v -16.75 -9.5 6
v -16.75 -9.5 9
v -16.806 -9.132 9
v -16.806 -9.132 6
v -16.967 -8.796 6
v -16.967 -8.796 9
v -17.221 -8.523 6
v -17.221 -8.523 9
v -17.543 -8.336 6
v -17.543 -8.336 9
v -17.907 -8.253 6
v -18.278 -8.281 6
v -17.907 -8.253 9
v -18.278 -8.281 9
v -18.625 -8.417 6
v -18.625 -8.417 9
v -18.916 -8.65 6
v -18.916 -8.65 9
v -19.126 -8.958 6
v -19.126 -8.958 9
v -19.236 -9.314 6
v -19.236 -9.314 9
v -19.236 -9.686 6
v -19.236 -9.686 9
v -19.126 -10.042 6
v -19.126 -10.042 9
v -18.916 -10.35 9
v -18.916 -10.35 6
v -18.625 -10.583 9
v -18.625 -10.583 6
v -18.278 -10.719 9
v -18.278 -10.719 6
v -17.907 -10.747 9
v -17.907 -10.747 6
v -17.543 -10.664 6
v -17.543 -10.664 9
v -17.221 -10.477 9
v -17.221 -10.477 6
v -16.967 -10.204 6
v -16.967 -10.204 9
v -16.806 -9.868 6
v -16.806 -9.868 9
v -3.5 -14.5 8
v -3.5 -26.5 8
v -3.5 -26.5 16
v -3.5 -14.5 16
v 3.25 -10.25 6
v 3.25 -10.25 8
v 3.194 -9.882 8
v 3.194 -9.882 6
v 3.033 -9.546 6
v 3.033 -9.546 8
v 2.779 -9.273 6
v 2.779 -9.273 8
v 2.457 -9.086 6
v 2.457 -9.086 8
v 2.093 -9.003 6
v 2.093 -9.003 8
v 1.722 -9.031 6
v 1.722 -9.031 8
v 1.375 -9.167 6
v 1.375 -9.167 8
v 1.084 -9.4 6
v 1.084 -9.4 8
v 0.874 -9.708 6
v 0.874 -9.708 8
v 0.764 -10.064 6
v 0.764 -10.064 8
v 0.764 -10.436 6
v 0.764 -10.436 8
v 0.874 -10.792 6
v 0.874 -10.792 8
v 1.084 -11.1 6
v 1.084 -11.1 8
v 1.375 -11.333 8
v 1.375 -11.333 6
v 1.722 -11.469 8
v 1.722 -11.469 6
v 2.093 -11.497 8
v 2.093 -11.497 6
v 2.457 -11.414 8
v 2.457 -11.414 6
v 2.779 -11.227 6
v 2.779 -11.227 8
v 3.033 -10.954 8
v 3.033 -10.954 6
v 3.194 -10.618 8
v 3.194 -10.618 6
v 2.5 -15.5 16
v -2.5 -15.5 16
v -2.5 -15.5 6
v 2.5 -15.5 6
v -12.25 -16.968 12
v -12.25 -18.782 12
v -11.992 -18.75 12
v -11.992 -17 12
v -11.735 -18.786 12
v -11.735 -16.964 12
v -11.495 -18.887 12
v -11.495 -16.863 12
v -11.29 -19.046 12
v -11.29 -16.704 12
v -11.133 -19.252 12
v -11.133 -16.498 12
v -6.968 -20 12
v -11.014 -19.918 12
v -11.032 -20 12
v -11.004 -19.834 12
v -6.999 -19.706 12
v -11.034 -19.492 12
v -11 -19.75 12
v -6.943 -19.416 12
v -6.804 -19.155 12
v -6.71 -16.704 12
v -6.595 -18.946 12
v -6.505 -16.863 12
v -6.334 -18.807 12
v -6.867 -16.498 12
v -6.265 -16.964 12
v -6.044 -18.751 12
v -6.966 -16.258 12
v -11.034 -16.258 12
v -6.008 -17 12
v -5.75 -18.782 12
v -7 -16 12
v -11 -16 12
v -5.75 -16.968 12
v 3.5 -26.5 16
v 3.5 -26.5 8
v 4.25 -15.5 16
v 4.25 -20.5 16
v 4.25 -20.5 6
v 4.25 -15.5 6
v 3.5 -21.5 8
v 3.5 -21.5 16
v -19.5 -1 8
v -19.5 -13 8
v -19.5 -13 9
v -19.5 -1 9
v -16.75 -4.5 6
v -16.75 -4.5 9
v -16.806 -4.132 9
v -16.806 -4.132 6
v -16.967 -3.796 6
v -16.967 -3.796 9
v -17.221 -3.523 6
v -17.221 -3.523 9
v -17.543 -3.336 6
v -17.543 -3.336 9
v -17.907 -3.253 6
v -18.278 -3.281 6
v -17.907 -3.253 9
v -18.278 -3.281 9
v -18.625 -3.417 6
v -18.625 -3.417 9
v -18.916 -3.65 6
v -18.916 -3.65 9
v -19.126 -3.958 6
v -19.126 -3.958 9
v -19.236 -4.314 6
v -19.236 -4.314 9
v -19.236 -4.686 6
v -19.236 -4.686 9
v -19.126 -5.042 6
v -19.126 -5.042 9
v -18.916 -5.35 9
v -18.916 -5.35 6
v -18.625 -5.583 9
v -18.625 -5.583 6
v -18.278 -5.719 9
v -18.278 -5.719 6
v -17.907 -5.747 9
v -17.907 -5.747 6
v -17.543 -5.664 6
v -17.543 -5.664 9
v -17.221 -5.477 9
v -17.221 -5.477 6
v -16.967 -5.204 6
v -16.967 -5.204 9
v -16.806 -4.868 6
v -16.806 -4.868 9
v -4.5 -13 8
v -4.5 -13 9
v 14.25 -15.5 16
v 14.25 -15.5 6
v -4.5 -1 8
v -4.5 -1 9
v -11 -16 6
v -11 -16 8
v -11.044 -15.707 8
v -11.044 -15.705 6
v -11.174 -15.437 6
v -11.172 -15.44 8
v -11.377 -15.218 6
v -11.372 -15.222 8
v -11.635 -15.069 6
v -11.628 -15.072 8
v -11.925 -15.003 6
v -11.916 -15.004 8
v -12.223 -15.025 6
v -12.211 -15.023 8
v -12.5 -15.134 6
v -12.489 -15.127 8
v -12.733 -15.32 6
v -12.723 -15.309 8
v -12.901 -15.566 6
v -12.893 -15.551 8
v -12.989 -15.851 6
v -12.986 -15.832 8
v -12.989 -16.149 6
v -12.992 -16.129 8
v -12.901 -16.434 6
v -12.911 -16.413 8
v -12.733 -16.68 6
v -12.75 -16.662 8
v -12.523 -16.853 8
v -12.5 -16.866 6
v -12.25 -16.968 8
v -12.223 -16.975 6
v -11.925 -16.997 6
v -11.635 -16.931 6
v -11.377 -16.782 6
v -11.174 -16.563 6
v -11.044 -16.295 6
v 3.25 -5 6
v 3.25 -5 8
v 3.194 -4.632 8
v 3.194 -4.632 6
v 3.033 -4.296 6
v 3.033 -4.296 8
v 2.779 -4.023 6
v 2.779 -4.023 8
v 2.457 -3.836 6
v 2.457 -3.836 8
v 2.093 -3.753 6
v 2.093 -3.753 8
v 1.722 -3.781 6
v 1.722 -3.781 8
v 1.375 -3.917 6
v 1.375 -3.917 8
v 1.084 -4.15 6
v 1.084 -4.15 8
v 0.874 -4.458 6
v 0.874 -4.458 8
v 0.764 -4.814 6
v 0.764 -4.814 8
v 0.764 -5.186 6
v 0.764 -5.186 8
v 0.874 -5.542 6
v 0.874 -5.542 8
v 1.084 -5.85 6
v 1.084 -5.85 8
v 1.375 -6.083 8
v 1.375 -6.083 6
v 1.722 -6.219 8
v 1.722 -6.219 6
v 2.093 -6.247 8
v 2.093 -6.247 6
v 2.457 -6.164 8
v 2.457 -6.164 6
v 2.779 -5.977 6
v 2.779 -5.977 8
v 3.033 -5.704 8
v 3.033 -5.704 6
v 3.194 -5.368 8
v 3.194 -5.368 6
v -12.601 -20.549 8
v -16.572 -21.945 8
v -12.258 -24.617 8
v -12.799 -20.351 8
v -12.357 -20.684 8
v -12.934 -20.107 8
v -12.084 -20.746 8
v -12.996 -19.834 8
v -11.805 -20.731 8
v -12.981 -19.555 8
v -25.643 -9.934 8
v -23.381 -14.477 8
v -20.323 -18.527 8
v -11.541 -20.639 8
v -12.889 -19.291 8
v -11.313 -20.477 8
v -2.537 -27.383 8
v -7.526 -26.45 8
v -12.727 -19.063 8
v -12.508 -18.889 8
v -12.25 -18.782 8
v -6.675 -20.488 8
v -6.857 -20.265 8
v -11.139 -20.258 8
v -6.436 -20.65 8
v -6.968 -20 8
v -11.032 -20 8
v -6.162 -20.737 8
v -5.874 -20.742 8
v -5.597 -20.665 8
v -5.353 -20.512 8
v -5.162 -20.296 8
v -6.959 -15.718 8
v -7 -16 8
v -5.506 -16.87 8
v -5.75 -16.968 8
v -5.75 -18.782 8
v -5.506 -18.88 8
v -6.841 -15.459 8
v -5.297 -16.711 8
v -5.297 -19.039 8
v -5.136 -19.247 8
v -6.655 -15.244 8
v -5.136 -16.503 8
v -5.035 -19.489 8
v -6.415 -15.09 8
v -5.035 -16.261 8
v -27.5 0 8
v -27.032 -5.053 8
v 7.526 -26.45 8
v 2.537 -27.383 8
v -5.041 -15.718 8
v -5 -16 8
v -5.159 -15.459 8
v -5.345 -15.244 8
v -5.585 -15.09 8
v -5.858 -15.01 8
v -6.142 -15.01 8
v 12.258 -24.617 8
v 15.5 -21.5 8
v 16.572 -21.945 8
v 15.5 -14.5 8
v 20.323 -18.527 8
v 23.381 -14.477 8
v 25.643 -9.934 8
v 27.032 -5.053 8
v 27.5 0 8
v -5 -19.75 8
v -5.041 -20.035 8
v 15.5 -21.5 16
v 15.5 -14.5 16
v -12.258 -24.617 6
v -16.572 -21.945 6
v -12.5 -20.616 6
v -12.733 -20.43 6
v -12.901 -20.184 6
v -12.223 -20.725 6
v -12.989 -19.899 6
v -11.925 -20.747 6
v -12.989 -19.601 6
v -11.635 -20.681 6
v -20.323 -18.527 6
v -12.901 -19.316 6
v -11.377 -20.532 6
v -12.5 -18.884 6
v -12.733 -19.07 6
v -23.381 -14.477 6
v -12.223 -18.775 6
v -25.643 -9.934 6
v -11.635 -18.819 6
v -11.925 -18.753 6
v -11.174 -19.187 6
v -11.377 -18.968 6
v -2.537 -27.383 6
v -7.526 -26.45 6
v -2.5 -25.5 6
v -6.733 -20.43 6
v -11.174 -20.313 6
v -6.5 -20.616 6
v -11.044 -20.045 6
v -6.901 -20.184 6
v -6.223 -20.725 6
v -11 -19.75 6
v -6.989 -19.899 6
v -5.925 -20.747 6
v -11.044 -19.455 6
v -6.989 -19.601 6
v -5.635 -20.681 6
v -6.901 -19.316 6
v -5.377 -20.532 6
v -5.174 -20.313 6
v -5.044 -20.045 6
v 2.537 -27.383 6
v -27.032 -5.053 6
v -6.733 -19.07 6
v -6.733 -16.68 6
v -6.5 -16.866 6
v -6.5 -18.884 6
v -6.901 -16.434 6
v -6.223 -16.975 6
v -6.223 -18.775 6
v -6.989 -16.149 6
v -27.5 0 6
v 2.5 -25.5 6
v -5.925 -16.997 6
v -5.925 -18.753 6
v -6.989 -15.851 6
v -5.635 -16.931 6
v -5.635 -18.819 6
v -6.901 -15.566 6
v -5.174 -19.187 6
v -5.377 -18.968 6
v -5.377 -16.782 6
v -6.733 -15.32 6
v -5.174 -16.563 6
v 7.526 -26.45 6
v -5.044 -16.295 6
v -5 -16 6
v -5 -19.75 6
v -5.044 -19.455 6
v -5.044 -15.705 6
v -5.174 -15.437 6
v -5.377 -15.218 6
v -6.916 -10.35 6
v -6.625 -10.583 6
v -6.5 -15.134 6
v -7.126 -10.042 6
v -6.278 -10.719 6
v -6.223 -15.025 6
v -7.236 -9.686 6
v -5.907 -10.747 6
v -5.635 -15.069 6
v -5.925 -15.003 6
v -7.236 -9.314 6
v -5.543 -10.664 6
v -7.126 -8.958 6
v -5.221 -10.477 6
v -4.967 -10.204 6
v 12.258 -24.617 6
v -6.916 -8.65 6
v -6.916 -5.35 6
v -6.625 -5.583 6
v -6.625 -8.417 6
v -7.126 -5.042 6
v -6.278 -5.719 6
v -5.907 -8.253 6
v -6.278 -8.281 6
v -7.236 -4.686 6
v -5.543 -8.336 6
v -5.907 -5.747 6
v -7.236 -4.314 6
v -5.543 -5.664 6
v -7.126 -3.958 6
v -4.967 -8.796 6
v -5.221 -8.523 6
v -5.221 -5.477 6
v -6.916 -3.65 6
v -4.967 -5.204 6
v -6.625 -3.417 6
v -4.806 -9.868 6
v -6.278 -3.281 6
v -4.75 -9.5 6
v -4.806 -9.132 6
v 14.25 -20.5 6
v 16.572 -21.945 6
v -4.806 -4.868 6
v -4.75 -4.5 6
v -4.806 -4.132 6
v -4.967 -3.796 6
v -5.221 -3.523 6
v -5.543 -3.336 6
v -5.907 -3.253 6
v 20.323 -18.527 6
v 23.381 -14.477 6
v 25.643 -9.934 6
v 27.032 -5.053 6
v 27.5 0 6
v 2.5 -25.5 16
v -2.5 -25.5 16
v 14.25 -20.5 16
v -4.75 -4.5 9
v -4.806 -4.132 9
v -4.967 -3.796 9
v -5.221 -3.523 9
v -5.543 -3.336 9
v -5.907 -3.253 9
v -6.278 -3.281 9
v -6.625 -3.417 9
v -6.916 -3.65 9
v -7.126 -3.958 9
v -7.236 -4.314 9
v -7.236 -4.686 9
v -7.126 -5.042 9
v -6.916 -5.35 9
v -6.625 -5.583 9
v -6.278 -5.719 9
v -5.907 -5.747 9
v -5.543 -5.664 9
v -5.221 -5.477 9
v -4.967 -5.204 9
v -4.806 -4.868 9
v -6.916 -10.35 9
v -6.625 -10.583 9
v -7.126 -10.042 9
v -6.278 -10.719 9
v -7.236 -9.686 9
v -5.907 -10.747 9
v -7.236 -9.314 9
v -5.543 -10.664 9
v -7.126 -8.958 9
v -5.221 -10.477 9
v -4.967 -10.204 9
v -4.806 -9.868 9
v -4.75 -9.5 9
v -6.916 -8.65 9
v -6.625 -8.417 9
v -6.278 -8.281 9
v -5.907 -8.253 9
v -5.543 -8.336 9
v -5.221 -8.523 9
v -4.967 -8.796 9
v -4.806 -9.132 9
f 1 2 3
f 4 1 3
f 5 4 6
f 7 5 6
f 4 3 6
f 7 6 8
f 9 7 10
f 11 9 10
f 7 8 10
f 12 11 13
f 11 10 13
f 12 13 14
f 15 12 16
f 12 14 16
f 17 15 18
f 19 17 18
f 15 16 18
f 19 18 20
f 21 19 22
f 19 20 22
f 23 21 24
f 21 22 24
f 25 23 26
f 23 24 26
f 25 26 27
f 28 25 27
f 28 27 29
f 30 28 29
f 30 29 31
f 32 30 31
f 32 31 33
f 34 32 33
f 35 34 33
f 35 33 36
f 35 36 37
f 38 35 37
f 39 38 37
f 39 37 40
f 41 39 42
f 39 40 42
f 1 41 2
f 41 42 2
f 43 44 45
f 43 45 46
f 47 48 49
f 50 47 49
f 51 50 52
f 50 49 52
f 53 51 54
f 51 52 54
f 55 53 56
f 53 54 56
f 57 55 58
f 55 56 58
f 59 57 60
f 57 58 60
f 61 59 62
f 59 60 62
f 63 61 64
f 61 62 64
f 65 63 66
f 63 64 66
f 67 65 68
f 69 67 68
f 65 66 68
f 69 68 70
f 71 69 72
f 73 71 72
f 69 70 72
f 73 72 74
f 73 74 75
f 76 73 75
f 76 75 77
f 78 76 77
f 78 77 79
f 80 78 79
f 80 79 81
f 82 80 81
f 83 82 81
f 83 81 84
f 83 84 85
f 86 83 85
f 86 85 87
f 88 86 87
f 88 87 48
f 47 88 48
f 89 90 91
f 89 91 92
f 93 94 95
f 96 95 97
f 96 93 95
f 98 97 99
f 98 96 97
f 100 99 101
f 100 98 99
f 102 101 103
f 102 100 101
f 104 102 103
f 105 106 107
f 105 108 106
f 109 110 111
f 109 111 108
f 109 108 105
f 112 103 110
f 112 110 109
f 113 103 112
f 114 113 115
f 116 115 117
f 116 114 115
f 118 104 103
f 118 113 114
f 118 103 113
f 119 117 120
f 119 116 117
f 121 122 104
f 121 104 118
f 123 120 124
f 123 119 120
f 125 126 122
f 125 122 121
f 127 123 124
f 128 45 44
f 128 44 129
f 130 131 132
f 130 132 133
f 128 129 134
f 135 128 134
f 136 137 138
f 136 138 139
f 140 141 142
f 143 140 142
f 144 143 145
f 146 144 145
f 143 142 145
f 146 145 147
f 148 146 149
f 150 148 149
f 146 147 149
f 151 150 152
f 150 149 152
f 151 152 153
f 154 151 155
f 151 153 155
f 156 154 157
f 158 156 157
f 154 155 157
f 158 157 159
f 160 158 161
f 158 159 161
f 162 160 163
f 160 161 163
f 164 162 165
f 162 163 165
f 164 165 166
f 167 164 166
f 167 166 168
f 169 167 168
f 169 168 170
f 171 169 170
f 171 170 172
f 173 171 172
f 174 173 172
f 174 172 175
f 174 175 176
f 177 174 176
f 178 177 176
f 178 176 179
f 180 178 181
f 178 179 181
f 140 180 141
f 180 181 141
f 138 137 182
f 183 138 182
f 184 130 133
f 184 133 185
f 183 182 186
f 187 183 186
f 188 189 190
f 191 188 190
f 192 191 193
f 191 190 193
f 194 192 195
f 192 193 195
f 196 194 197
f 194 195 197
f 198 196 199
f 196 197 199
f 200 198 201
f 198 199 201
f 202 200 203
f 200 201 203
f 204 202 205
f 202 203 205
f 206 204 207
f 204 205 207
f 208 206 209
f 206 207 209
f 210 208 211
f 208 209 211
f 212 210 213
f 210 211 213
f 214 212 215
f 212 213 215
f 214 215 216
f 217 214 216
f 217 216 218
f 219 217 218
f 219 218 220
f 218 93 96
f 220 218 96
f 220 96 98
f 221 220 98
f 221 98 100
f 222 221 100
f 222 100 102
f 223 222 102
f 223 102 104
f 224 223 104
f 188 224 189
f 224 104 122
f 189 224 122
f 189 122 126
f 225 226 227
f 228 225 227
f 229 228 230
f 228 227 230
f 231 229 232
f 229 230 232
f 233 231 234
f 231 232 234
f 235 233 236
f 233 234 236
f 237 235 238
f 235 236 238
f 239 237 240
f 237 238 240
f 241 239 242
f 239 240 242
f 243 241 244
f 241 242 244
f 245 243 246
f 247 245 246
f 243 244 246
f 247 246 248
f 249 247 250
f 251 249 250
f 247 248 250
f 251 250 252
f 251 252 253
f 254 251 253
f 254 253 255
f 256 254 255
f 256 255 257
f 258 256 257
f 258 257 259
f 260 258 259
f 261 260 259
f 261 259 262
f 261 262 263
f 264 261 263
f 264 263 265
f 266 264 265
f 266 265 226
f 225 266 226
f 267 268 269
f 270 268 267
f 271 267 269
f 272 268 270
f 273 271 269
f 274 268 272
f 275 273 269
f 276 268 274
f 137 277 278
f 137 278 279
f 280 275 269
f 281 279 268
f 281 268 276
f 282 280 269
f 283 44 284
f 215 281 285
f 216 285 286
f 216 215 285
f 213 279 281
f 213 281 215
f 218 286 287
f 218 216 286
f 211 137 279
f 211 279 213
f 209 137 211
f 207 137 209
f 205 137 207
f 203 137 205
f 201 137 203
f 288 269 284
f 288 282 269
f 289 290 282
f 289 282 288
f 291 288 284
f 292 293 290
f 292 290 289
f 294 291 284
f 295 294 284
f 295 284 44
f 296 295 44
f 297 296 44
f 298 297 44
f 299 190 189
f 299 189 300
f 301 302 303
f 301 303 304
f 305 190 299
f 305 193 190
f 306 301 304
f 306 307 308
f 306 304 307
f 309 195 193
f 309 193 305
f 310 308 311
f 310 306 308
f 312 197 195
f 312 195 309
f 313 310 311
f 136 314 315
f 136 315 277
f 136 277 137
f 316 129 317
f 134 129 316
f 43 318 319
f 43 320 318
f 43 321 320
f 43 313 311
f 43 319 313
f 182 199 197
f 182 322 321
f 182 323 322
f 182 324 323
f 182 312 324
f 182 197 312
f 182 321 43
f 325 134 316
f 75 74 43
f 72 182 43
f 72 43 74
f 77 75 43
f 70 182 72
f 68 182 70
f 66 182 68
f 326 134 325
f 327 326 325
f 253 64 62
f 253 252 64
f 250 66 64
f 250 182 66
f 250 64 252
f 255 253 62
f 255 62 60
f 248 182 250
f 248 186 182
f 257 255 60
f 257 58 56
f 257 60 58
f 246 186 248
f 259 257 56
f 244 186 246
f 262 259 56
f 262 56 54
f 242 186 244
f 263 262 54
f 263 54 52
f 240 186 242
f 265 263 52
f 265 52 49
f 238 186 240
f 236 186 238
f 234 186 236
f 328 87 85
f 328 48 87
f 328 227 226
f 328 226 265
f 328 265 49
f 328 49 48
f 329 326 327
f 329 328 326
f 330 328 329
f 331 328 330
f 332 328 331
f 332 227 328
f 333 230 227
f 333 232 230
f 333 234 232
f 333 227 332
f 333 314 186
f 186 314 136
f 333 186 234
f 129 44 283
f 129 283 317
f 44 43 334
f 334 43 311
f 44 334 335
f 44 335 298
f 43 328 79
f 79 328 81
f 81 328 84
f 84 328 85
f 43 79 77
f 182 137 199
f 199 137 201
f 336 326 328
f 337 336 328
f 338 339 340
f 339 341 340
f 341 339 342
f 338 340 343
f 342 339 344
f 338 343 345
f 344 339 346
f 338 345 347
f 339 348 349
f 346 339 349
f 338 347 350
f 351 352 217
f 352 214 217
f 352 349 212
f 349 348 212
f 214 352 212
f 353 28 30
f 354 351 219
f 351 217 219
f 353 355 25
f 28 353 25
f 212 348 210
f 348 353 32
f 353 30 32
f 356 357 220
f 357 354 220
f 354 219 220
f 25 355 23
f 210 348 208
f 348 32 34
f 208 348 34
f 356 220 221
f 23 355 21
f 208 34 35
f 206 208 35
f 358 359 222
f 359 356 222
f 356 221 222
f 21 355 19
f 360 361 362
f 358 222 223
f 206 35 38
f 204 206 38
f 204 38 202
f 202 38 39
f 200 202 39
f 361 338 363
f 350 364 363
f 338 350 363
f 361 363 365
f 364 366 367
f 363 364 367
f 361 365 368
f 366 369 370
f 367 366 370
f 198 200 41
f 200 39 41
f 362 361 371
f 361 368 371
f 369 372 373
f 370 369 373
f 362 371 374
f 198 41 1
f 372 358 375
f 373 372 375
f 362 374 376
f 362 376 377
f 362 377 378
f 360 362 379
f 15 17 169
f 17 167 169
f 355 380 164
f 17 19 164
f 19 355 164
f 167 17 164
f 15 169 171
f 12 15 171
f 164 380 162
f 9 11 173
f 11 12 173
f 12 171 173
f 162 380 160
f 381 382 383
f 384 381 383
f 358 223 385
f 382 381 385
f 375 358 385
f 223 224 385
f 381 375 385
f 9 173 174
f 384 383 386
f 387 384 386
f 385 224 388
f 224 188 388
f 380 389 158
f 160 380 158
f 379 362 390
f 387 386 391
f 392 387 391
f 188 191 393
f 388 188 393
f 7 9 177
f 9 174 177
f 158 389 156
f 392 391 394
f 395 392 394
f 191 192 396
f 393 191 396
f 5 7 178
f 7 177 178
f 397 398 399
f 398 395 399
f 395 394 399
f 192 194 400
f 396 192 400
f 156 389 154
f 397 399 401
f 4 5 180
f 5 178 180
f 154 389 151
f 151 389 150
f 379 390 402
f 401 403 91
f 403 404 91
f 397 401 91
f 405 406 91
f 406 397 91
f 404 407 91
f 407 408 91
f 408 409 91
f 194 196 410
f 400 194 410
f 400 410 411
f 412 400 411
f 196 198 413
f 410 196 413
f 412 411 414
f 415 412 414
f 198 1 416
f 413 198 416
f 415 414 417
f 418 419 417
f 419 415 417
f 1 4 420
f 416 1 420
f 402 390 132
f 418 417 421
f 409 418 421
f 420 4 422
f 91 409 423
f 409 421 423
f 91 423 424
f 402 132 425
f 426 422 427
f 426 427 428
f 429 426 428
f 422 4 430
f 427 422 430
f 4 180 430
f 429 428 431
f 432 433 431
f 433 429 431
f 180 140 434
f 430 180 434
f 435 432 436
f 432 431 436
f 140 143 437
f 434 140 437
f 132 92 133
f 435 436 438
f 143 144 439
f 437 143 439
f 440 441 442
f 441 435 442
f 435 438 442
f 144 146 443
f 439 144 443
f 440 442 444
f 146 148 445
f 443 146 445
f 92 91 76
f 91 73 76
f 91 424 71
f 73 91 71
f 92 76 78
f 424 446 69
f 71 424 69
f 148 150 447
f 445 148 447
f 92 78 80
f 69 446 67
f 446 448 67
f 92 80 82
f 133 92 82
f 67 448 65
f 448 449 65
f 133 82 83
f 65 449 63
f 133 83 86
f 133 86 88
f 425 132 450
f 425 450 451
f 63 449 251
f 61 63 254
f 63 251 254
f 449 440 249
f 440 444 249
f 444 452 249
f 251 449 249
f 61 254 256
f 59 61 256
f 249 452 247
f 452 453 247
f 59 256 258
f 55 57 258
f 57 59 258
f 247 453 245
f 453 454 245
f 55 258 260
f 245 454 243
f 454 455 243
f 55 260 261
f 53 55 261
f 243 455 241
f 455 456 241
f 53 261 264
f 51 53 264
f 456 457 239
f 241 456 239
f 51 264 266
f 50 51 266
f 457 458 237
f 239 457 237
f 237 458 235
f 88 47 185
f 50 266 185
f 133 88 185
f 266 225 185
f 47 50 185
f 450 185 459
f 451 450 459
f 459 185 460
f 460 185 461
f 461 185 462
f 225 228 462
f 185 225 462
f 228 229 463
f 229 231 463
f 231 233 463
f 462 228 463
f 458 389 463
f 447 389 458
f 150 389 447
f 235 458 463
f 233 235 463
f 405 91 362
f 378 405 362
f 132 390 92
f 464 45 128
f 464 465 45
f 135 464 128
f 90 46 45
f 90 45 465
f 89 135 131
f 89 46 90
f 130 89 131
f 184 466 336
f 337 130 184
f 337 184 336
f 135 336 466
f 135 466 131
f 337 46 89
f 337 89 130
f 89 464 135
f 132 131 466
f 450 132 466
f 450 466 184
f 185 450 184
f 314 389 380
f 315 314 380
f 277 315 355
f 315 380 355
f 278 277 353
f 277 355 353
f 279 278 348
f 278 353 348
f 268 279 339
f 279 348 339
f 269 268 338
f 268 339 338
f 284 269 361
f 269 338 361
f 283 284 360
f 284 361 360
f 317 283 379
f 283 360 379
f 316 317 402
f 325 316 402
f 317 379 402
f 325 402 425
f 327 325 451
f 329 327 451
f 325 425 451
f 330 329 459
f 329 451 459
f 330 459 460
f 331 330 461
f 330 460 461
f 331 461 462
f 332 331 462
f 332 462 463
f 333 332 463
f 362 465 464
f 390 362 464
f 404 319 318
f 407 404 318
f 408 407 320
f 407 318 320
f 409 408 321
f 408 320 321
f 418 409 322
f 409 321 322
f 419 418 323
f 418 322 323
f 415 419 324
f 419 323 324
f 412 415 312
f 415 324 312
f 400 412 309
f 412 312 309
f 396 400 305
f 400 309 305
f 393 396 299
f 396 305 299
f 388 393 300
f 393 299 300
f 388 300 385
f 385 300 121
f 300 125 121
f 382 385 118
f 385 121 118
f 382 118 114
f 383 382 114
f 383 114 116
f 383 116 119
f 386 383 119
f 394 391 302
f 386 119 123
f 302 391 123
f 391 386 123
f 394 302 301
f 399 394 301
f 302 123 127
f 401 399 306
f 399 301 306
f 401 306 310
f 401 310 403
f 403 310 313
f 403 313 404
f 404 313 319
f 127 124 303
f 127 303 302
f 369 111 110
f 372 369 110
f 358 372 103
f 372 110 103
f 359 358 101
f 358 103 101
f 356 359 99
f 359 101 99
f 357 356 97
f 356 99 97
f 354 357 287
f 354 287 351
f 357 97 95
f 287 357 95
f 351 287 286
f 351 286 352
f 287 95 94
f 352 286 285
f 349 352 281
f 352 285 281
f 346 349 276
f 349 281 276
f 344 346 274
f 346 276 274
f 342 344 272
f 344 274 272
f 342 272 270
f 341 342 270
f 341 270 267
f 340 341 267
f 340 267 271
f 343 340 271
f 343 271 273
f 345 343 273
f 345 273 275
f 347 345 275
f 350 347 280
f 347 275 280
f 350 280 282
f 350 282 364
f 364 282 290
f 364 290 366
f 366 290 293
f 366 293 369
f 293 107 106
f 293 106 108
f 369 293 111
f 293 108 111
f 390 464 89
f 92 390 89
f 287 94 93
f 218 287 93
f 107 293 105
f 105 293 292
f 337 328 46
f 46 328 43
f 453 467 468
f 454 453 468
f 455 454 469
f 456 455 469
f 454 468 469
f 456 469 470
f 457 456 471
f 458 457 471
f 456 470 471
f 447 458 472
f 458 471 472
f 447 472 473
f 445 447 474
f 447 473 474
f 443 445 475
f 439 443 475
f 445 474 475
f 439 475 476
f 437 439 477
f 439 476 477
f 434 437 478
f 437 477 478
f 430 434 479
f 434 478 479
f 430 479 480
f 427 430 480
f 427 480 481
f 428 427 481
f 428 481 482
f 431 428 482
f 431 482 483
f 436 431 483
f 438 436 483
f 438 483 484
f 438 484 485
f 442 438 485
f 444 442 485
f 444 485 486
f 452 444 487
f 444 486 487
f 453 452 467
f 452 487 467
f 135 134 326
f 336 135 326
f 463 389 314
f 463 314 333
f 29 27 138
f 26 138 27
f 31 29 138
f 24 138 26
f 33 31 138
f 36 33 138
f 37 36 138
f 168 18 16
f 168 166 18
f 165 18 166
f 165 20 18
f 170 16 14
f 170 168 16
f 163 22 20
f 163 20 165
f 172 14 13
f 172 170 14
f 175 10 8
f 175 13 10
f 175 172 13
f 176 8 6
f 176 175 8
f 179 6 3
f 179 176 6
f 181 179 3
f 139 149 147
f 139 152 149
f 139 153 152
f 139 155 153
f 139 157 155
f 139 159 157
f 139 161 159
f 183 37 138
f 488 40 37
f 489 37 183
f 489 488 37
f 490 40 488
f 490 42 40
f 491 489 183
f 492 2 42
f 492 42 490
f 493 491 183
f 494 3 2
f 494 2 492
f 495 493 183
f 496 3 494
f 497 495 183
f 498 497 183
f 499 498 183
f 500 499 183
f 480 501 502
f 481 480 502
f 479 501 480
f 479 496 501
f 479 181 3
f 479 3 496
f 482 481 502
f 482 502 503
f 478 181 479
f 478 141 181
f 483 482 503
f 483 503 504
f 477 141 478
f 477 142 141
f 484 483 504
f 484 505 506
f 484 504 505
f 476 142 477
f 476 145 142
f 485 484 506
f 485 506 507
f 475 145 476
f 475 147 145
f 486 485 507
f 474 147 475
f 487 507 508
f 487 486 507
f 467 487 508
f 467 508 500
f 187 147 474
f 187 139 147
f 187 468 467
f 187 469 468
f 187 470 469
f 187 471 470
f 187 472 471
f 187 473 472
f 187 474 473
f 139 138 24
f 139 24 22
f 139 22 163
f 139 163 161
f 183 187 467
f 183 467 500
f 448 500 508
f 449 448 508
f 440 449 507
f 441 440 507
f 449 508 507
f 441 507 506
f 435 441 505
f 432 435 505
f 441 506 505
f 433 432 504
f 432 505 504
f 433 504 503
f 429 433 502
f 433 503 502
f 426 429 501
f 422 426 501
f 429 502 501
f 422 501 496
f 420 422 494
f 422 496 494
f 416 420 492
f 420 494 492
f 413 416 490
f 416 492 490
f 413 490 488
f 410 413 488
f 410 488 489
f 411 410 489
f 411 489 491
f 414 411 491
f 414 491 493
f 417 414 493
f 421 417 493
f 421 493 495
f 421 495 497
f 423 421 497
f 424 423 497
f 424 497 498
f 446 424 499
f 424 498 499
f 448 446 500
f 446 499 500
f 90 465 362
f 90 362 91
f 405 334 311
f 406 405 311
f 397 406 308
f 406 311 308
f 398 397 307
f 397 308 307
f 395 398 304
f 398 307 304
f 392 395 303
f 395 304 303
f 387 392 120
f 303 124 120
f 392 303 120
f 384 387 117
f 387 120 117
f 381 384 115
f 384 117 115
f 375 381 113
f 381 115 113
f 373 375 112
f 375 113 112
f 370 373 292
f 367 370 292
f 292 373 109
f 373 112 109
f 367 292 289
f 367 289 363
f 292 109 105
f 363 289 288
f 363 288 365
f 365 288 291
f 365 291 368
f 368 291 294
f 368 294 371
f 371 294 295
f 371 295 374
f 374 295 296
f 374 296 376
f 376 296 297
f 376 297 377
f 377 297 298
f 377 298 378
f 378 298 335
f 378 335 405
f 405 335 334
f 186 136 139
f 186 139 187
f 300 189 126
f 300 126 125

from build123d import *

# Parameters (mm, degrees)
SKETCH009_W      = 5
SKETCH009_H      = 10
SKETCH009_W_2    = 10
SKETCH009_H_2    = 5
EXTRUDE008_DEPTH = 10
SKETCH008_R      = 1
EXTRUDE007_DEPTH = 6
SKETCH007_R      = 1.25
EXTRUDE006_DEPTH = 3
SKETCH004_R      = 1.25
EXTRUDE005_DEPTH = 3
SKETCH005_W      = 6.5
SKETCH005_H      = 4
EXTRUDE004_DEPTH = 4
SKETCH006_W      = 12
SKETCH006_H      = 7
SKETCH006_W_2    = 7
SKETCH006_H_2    = 12
EXTRUDE003_DEPTH = 8
SKETCH003_W      = 15
SKETCH003_H      = 12
EXTRUDE002_DEPTH = 1
EXTRUDE001_DEPTH = 6
EXTRUDE_DEPTH    = 8


with BuildPart() as usb_cuts:
    # Sketch009 → Extrude008 (new body)
    with BuildSketch(Plane.XY.offset(16)):
        with Locations((0, -20.5)):
            Rectangle(SKETCH009_W, SKETCH009_H)
        with Locations((9.25, -18)):
            Rectangle(SKETCH009_W_2, SKETCH009_H_2)
    extrude(amount=-EXTRUDE008_DEPTH)


with BuildPart() as reset_leads:
    # Sketch008 → Extrude007 (new body)
    with BuildSketch(Plane.XY.offset(12)):
        with Locations((-12, -16)):
            Circle(SKETCH008_R)
        with Locations((-6, -19.75)):
            Circle(SKETCH008_R)
        with Locations((-6, -16)):
            Circle(SKETCH008_R)
        with Locations((-12, -19.75)):
            Circle(SKETCH008_R)
    extrude(amount=-EXTRUDE007_DEPTH)


with BuildPart() as momentary_leads:
    # Sketch007 → Extrude006 (new body)
    with BuildSketch(Plane.XY.offset(9)):
        with Locations((-18, -9.5)):
            Circle(SKETCH007_R)
        with Locations((-18, -4.5)):
            Circle(SKETCH007_R)
        with Locations((-6, -9.5)):
            Circle(SKETCH007_R)
        with Locations((-6, -4.5)):
            Circle(SKETCH007_R)
    extrude(amount=-EXTRUDE006_DEPTH)


with BuildPart() as powerbuttonleads:
    # Sketch004 → Extrude005 (new body)
    with BuildSketch(Plane.XY.offset(8)):
        with Locations((2, -10.25)):
            Circle(SKETCH004_R)
        with Locations((2, -5)):
            Circle(SKETCH004_R)
    extrude(amount=-EXTRUDE005_DEPTH)


with BuildPart() as resetbutton001:
    # Sketch005 → Extrude004 (new body)
    with BuildSketch(Plane.XY.offset(8)):
        with Locations((-9, -18)):
            Rectangle(SKETCH005_W, SKETCH005_H)
    extrude(amount=EXTRUDE004_DEPTH)


with BuildPart() as usb_ports001:
    # Sketch006 → Extrude003 (new body)
    with BuildSketch(Plane.XY.offset(8)):
        with Locations((9.5, -18)):
            Rectangle(SKETCH006_W, SKETCH006_H)
        with Locations((0, -20.5)):
            Rectangle(SKETCH006_W_2, SKETCH006_H_2)
    extrude(amount=EXTRUDE003_DEPTH)


with BuildPart() as momentary_button:
    # Sketch003 → Extrude002 (new body)
    with BuildSketch(Plane.XY.offset(8)):
        with Locations((-12, -7)):
            Rectangle(SKETCH003_W, SKETCH003_H)
    extrude(amount=EXTRUDE002_DEPTH)


with BuildPart() as body_cut:
    # Sketch002 → Extrude001 (new body)
    with BuildSketch(Plane.XY):
        with BuildLine():
            ThreePointArc((-27.5, 0), (0, -27.5), (27.5, 0))
            Line((-27.5, 0), (27.5, 0))
        make_face()
    extrude(amount=EXTRUDE001_DEPTH)


with BuildPart() as cut004:
    # Sketch001 → Extrude (new body)
    with BuildSketch(Plane.XY):
        with BuildLine():
            ThreePointArc((-27.5, 0), (0, -27.5), (27.5, 0))
            Line((-27.5, 0), (27.5, 0))
        make_face()
    extrude(amount=EXTRUDE_DEPTH)

    # Cut: cut Body Cut
    add(body_cut.part, mode=Mode.SUBTRACT)

    # Fusion: union Momentary Button
    add(momentary_button.part)

    # Fusion001: union USB Ports001
    add(usb_ports001.part)

    # Fusion002: union ResetButton001
    add(resetbutton001.part)

    # Cut001: cut PowerButtonLeads
    add(powerbuttonleads.part, mode=Mode.SUBTRACT)

    # Cut002: cut momentary Leads
    add(momentary_leads.part, mode=Mode.SUBTRACT)

    # Cut003: cut Reset Leads
    add(reset_leads.part, mode=Mode.SUBTRACT)

    # Cut004: cut USB Cuts
    add(usb_cuts.part, mode=Mode.SUBTRACT)


solid = cut004.part
